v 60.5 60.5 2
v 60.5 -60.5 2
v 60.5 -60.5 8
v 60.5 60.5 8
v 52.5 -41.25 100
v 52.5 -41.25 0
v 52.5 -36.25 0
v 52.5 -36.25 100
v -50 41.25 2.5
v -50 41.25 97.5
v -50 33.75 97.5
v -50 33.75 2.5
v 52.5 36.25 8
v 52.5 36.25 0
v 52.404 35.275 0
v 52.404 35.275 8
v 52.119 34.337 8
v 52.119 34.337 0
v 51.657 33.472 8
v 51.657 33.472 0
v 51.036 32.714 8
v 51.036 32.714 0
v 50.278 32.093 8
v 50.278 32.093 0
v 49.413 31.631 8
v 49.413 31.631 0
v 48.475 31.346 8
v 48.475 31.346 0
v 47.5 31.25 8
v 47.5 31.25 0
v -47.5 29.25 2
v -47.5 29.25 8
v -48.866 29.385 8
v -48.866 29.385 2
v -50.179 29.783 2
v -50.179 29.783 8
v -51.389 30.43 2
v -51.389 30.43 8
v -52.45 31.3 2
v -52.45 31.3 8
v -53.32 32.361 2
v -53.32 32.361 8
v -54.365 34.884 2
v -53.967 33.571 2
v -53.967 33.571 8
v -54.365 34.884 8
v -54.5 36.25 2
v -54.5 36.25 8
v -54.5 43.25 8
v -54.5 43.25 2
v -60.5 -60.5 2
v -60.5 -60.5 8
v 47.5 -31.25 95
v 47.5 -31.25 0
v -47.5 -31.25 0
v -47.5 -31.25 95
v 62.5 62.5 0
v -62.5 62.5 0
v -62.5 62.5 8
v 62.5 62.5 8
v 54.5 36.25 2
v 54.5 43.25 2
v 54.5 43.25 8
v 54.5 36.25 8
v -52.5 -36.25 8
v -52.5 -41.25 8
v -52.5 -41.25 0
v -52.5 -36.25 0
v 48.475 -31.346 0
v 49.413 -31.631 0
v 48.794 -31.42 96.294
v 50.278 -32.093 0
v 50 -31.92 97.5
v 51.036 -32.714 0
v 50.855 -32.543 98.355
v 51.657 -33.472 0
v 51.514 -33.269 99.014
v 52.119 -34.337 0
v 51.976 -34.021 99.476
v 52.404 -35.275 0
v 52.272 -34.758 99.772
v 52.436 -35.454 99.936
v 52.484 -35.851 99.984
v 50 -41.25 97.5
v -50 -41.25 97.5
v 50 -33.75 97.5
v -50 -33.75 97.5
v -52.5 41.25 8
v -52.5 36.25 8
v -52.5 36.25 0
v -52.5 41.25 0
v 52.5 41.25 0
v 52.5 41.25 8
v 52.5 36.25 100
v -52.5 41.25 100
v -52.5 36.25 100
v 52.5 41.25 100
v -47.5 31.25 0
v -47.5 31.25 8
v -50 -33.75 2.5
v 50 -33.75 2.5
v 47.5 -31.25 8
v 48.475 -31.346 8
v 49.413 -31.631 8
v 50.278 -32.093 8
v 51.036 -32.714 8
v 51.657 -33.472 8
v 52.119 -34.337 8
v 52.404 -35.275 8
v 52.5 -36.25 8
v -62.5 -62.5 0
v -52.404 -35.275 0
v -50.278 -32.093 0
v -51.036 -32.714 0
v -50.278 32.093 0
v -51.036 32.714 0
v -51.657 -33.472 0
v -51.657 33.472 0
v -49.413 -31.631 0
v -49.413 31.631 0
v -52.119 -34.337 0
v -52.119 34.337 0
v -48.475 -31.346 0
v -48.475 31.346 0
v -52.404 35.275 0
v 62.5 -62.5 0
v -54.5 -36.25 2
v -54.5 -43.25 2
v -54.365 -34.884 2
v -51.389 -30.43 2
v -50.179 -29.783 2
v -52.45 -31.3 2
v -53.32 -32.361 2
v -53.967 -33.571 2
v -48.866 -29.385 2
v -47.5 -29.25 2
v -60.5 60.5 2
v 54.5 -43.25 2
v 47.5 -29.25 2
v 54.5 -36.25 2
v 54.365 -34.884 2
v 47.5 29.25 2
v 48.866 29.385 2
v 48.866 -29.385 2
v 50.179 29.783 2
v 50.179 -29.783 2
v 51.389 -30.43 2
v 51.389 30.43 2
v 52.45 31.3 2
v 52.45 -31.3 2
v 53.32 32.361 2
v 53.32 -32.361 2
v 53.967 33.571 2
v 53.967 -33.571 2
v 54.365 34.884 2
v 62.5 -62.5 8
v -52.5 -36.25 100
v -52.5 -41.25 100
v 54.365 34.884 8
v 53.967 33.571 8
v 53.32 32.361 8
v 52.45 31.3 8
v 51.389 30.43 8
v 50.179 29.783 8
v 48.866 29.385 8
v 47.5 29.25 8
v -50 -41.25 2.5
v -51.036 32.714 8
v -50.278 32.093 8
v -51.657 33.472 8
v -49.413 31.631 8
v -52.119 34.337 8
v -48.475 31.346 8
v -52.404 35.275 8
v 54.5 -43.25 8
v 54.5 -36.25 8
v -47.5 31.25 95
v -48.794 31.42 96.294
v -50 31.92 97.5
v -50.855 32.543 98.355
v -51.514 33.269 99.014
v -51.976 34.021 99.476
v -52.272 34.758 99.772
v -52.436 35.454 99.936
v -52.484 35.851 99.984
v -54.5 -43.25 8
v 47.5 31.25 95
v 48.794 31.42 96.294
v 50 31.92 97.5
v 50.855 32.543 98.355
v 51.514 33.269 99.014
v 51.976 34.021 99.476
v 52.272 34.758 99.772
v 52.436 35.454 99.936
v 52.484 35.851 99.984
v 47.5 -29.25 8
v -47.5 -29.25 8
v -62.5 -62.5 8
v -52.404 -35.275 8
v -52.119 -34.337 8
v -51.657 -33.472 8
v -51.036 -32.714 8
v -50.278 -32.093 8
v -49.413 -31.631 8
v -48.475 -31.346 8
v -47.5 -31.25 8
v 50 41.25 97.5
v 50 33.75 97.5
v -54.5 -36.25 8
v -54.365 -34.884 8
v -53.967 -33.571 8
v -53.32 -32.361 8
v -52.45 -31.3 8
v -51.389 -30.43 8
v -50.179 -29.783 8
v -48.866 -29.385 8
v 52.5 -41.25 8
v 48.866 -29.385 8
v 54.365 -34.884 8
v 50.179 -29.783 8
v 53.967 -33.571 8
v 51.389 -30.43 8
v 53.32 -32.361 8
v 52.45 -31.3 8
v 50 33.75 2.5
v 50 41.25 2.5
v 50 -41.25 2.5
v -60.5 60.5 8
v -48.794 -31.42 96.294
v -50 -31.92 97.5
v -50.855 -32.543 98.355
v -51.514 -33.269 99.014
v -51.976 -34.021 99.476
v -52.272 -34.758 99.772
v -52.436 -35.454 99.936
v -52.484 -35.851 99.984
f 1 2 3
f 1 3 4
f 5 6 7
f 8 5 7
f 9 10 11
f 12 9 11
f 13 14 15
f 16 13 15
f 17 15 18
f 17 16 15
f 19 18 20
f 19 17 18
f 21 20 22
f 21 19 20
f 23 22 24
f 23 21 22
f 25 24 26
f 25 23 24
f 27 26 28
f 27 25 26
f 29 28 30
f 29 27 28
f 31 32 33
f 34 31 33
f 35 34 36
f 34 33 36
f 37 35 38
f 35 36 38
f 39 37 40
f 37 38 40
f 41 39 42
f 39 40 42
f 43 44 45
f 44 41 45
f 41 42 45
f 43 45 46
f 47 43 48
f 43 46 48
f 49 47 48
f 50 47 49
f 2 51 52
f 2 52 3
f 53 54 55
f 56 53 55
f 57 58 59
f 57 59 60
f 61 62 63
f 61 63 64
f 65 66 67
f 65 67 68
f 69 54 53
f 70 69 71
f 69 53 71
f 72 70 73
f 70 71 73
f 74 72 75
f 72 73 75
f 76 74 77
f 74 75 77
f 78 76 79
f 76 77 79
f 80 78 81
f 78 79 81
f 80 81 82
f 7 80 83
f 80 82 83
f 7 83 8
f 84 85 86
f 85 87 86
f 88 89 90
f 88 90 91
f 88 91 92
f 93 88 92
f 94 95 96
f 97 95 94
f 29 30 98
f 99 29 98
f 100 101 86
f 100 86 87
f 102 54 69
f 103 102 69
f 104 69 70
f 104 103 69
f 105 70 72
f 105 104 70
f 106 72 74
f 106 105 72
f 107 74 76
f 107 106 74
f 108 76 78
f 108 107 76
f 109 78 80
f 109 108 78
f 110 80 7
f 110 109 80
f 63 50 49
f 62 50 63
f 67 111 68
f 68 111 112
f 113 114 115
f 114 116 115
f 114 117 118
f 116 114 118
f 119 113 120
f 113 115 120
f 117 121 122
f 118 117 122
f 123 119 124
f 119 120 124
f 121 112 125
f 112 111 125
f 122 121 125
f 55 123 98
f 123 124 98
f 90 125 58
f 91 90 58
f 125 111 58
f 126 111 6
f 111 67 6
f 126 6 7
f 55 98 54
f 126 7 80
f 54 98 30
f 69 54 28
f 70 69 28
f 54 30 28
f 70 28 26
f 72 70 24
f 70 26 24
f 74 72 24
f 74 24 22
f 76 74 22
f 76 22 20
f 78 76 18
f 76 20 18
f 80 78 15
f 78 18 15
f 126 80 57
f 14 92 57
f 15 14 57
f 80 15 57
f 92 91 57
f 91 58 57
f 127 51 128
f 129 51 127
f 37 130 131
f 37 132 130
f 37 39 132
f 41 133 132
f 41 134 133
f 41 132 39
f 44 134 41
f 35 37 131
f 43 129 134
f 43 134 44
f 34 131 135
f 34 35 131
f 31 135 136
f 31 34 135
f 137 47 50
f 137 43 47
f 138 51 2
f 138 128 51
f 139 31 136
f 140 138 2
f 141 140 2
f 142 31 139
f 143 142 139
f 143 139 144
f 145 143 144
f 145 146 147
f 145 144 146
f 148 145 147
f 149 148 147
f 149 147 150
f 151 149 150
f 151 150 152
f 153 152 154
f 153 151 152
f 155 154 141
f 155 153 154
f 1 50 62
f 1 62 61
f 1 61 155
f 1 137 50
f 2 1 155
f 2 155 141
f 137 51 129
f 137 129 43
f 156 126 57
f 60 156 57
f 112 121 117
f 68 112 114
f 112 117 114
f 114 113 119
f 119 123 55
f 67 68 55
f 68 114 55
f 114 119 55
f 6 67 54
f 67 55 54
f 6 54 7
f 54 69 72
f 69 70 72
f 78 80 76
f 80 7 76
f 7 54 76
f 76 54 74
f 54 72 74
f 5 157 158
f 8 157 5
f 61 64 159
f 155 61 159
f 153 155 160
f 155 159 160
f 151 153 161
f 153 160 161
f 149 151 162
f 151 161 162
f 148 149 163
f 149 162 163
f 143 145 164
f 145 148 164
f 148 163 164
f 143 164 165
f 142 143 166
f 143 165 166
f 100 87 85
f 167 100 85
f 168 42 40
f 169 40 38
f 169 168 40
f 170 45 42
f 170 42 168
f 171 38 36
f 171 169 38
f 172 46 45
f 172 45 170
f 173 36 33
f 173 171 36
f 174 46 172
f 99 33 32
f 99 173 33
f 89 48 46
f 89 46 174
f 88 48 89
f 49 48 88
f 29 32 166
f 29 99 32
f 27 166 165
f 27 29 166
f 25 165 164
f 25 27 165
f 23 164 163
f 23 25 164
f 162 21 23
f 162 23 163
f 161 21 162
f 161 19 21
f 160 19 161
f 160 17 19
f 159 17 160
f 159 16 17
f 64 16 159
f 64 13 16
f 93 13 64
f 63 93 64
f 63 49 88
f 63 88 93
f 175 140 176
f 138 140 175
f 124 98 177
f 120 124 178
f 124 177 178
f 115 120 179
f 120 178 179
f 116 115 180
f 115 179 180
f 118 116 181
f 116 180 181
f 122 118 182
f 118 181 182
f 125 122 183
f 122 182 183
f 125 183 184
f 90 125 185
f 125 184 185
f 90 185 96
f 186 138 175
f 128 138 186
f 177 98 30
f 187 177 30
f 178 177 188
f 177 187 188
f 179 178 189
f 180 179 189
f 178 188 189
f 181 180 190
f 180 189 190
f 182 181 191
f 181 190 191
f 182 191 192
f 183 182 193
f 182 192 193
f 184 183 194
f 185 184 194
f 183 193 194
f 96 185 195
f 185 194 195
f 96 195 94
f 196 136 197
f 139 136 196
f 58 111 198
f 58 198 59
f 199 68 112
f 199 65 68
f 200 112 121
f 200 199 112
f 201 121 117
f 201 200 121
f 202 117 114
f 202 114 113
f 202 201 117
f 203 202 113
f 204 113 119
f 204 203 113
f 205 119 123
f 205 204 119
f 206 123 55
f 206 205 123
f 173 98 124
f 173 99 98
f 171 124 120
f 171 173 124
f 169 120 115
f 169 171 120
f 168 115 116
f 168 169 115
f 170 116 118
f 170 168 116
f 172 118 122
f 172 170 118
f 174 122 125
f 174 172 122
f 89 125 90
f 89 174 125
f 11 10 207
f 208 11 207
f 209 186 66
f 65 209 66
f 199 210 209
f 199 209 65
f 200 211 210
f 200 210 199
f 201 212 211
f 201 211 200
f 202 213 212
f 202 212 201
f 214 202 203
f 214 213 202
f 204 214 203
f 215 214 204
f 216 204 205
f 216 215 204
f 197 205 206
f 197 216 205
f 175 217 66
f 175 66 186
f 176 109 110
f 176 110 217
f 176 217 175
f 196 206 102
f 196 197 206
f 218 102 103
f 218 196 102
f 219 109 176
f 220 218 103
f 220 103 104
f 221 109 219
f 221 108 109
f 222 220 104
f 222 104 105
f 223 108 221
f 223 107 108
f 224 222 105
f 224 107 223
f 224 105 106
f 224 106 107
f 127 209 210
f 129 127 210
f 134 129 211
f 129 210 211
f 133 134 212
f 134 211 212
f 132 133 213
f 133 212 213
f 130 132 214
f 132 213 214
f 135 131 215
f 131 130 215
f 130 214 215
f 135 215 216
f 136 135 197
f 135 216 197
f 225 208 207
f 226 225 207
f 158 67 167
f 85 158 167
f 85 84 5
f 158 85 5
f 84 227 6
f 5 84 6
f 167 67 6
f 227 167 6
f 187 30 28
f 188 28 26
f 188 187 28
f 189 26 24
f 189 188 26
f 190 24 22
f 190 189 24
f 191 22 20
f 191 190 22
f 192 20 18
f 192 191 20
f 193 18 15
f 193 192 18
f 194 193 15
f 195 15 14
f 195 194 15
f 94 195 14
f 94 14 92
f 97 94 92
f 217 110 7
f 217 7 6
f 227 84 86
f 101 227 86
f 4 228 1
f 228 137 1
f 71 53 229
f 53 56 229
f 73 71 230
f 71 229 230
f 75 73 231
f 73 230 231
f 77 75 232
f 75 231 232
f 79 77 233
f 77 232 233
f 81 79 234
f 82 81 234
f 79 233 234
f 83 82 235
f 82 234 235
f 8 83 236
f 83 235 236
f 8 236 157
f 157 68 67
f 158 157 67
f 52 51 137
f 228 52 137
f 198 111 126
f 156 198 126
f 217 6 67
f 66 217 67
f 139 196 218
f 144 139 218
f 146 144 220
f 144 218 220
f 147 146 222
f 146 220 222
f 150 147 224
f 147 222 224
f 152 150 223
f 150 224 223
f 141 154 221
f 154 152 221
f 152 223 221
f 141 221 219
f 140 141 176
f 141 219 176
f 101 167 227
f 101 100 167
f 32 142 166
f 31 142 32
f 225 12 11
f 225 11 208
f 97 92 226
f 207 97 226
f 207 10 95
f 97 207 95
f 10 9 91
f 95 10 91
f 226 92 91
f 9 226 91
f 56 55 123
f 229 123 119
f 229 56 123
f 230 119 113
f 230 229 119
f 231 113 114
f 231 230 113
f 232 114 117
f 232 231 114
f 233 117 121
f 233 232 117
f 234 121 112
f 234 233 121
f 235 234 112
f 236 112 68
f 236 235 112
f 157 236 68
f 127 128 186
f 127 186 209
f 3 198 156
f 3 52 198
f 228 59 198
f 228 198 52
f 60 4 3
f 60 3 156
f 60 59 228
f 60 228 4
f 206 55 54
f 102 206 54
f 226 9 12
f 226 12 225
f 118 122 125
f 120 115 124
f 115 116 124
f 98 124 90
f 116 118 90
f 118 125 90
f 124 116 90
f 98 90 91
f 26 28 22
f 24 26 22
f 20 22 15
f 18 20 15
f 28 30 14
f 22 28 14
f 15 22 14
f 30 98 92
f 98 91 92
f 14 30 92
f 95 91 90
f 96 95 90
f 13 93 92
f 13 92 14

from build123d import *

# Parameters (mm, degrees)
F0_W     = 125
F0_H     = 125
F1_DEPTH = 8
F2_DEPTH = 100
F3_T     = -2.5
F3_2_T   = -2.5
F4_R     = 5
F4_2_R   = 5
F5_R     = 5
F6_T     = -2


with BuildPart() as f1:
    # F0 (on Top) → F1 (new body)
    with BuildSketch(Plane.XY):
        Rectangle(F0_W, F0_H)
        Polygon((-52.5, -31.25), (0, -31.25), (52.5, -31.25), (52.5, -41.25), (0, -41.25), (-52.5, -41.25), align=None, mode=Mode.SUBTRACT)
        Polygon((52.5, 31.25), (0, 31.25), (-52.5, 31.25), (-52.5, 41.25), (0, 41.25), (52.5, 41.25), align=None, mode=Mode.SUBTRACT)
    extrude(amount=F1_DEPTH)

    # F5
    f5_edges = [f1.edges().sort_by_distance(p)[0] for p in [
        (52.5, 31.25, 4),
        (-52.5, 31.25, 4),
        (-52.5, -31.25, 4),
        (52.5, -31.25, 4),
    ]]
    fillet(f5_edges, radius=F5_R)

    # F6
    f6_openings = [f1.faces().sort_by_distance(p)[0] for p in [
        (0, 0, 8),
    ]]
    offset(amount=F6_T, openings=f6_openings, kind=Kind.INTERSECTION)


with BuildPart() as f2:
    # F0 (on Top) → F2 (new body)
    with BuildSketch(Plane.XY):
        Polygon((52.5, -31.25), (0, -31.25), (-52.5, -31.25), (-52.5, -41.25), (0, -41.25), (52.5, -41.25), align=None)
    extrude(amount=F2_DEPTH)

    # F3#2
    f3_2_openings = [f2.faces().sort_by_distance(p)[0] for p in [
        (0, -41.25, 50),
    ]]
    offset(amount=F3_2_T, openings=f3_2_openings)

    # F4#2
    f4_2_edges = [f2.edges().sort_by_distance(p)[0] for p in [
        (-52.5, -31.25, 50),
        (0, -31.25, 100),
        (52.5, -31.25, 50),
    ]]
    fillet(f4_2_edges, radius=F4_2_R)


with BuildPart() as f2b:
    # F0 (on Top) → F2, piece 2 (new body)
    with BuildSketch(Plane.XY):
        Polygon((-52.5, 31.25), (0, 31.25), (52.5, 31.25), (52.5, 41.25), (0, 41.25), (-52.5, 41.25), align=None)
    extrude(amount=F2_DEPTH)

    # F3
    f3_openings = [f2b.faces().sort_by_distance(p)[0] for p in [
        (0, 41.25, 50),
    ]]
    offset(amount=F3_T, openings=f3_openings)

    # F4
    f4_edges = [f2b.edges().sort_by_distance(p)[0] for p in [
        (-52.5, 31.25, 50),
        (0, 31.25, 100),
        (52.5, 31.25, 50),
    ]]
    fillet(f4_edges, radius=F4_R)


solid = Compound([f1.part, f2.part, f2b.part])
